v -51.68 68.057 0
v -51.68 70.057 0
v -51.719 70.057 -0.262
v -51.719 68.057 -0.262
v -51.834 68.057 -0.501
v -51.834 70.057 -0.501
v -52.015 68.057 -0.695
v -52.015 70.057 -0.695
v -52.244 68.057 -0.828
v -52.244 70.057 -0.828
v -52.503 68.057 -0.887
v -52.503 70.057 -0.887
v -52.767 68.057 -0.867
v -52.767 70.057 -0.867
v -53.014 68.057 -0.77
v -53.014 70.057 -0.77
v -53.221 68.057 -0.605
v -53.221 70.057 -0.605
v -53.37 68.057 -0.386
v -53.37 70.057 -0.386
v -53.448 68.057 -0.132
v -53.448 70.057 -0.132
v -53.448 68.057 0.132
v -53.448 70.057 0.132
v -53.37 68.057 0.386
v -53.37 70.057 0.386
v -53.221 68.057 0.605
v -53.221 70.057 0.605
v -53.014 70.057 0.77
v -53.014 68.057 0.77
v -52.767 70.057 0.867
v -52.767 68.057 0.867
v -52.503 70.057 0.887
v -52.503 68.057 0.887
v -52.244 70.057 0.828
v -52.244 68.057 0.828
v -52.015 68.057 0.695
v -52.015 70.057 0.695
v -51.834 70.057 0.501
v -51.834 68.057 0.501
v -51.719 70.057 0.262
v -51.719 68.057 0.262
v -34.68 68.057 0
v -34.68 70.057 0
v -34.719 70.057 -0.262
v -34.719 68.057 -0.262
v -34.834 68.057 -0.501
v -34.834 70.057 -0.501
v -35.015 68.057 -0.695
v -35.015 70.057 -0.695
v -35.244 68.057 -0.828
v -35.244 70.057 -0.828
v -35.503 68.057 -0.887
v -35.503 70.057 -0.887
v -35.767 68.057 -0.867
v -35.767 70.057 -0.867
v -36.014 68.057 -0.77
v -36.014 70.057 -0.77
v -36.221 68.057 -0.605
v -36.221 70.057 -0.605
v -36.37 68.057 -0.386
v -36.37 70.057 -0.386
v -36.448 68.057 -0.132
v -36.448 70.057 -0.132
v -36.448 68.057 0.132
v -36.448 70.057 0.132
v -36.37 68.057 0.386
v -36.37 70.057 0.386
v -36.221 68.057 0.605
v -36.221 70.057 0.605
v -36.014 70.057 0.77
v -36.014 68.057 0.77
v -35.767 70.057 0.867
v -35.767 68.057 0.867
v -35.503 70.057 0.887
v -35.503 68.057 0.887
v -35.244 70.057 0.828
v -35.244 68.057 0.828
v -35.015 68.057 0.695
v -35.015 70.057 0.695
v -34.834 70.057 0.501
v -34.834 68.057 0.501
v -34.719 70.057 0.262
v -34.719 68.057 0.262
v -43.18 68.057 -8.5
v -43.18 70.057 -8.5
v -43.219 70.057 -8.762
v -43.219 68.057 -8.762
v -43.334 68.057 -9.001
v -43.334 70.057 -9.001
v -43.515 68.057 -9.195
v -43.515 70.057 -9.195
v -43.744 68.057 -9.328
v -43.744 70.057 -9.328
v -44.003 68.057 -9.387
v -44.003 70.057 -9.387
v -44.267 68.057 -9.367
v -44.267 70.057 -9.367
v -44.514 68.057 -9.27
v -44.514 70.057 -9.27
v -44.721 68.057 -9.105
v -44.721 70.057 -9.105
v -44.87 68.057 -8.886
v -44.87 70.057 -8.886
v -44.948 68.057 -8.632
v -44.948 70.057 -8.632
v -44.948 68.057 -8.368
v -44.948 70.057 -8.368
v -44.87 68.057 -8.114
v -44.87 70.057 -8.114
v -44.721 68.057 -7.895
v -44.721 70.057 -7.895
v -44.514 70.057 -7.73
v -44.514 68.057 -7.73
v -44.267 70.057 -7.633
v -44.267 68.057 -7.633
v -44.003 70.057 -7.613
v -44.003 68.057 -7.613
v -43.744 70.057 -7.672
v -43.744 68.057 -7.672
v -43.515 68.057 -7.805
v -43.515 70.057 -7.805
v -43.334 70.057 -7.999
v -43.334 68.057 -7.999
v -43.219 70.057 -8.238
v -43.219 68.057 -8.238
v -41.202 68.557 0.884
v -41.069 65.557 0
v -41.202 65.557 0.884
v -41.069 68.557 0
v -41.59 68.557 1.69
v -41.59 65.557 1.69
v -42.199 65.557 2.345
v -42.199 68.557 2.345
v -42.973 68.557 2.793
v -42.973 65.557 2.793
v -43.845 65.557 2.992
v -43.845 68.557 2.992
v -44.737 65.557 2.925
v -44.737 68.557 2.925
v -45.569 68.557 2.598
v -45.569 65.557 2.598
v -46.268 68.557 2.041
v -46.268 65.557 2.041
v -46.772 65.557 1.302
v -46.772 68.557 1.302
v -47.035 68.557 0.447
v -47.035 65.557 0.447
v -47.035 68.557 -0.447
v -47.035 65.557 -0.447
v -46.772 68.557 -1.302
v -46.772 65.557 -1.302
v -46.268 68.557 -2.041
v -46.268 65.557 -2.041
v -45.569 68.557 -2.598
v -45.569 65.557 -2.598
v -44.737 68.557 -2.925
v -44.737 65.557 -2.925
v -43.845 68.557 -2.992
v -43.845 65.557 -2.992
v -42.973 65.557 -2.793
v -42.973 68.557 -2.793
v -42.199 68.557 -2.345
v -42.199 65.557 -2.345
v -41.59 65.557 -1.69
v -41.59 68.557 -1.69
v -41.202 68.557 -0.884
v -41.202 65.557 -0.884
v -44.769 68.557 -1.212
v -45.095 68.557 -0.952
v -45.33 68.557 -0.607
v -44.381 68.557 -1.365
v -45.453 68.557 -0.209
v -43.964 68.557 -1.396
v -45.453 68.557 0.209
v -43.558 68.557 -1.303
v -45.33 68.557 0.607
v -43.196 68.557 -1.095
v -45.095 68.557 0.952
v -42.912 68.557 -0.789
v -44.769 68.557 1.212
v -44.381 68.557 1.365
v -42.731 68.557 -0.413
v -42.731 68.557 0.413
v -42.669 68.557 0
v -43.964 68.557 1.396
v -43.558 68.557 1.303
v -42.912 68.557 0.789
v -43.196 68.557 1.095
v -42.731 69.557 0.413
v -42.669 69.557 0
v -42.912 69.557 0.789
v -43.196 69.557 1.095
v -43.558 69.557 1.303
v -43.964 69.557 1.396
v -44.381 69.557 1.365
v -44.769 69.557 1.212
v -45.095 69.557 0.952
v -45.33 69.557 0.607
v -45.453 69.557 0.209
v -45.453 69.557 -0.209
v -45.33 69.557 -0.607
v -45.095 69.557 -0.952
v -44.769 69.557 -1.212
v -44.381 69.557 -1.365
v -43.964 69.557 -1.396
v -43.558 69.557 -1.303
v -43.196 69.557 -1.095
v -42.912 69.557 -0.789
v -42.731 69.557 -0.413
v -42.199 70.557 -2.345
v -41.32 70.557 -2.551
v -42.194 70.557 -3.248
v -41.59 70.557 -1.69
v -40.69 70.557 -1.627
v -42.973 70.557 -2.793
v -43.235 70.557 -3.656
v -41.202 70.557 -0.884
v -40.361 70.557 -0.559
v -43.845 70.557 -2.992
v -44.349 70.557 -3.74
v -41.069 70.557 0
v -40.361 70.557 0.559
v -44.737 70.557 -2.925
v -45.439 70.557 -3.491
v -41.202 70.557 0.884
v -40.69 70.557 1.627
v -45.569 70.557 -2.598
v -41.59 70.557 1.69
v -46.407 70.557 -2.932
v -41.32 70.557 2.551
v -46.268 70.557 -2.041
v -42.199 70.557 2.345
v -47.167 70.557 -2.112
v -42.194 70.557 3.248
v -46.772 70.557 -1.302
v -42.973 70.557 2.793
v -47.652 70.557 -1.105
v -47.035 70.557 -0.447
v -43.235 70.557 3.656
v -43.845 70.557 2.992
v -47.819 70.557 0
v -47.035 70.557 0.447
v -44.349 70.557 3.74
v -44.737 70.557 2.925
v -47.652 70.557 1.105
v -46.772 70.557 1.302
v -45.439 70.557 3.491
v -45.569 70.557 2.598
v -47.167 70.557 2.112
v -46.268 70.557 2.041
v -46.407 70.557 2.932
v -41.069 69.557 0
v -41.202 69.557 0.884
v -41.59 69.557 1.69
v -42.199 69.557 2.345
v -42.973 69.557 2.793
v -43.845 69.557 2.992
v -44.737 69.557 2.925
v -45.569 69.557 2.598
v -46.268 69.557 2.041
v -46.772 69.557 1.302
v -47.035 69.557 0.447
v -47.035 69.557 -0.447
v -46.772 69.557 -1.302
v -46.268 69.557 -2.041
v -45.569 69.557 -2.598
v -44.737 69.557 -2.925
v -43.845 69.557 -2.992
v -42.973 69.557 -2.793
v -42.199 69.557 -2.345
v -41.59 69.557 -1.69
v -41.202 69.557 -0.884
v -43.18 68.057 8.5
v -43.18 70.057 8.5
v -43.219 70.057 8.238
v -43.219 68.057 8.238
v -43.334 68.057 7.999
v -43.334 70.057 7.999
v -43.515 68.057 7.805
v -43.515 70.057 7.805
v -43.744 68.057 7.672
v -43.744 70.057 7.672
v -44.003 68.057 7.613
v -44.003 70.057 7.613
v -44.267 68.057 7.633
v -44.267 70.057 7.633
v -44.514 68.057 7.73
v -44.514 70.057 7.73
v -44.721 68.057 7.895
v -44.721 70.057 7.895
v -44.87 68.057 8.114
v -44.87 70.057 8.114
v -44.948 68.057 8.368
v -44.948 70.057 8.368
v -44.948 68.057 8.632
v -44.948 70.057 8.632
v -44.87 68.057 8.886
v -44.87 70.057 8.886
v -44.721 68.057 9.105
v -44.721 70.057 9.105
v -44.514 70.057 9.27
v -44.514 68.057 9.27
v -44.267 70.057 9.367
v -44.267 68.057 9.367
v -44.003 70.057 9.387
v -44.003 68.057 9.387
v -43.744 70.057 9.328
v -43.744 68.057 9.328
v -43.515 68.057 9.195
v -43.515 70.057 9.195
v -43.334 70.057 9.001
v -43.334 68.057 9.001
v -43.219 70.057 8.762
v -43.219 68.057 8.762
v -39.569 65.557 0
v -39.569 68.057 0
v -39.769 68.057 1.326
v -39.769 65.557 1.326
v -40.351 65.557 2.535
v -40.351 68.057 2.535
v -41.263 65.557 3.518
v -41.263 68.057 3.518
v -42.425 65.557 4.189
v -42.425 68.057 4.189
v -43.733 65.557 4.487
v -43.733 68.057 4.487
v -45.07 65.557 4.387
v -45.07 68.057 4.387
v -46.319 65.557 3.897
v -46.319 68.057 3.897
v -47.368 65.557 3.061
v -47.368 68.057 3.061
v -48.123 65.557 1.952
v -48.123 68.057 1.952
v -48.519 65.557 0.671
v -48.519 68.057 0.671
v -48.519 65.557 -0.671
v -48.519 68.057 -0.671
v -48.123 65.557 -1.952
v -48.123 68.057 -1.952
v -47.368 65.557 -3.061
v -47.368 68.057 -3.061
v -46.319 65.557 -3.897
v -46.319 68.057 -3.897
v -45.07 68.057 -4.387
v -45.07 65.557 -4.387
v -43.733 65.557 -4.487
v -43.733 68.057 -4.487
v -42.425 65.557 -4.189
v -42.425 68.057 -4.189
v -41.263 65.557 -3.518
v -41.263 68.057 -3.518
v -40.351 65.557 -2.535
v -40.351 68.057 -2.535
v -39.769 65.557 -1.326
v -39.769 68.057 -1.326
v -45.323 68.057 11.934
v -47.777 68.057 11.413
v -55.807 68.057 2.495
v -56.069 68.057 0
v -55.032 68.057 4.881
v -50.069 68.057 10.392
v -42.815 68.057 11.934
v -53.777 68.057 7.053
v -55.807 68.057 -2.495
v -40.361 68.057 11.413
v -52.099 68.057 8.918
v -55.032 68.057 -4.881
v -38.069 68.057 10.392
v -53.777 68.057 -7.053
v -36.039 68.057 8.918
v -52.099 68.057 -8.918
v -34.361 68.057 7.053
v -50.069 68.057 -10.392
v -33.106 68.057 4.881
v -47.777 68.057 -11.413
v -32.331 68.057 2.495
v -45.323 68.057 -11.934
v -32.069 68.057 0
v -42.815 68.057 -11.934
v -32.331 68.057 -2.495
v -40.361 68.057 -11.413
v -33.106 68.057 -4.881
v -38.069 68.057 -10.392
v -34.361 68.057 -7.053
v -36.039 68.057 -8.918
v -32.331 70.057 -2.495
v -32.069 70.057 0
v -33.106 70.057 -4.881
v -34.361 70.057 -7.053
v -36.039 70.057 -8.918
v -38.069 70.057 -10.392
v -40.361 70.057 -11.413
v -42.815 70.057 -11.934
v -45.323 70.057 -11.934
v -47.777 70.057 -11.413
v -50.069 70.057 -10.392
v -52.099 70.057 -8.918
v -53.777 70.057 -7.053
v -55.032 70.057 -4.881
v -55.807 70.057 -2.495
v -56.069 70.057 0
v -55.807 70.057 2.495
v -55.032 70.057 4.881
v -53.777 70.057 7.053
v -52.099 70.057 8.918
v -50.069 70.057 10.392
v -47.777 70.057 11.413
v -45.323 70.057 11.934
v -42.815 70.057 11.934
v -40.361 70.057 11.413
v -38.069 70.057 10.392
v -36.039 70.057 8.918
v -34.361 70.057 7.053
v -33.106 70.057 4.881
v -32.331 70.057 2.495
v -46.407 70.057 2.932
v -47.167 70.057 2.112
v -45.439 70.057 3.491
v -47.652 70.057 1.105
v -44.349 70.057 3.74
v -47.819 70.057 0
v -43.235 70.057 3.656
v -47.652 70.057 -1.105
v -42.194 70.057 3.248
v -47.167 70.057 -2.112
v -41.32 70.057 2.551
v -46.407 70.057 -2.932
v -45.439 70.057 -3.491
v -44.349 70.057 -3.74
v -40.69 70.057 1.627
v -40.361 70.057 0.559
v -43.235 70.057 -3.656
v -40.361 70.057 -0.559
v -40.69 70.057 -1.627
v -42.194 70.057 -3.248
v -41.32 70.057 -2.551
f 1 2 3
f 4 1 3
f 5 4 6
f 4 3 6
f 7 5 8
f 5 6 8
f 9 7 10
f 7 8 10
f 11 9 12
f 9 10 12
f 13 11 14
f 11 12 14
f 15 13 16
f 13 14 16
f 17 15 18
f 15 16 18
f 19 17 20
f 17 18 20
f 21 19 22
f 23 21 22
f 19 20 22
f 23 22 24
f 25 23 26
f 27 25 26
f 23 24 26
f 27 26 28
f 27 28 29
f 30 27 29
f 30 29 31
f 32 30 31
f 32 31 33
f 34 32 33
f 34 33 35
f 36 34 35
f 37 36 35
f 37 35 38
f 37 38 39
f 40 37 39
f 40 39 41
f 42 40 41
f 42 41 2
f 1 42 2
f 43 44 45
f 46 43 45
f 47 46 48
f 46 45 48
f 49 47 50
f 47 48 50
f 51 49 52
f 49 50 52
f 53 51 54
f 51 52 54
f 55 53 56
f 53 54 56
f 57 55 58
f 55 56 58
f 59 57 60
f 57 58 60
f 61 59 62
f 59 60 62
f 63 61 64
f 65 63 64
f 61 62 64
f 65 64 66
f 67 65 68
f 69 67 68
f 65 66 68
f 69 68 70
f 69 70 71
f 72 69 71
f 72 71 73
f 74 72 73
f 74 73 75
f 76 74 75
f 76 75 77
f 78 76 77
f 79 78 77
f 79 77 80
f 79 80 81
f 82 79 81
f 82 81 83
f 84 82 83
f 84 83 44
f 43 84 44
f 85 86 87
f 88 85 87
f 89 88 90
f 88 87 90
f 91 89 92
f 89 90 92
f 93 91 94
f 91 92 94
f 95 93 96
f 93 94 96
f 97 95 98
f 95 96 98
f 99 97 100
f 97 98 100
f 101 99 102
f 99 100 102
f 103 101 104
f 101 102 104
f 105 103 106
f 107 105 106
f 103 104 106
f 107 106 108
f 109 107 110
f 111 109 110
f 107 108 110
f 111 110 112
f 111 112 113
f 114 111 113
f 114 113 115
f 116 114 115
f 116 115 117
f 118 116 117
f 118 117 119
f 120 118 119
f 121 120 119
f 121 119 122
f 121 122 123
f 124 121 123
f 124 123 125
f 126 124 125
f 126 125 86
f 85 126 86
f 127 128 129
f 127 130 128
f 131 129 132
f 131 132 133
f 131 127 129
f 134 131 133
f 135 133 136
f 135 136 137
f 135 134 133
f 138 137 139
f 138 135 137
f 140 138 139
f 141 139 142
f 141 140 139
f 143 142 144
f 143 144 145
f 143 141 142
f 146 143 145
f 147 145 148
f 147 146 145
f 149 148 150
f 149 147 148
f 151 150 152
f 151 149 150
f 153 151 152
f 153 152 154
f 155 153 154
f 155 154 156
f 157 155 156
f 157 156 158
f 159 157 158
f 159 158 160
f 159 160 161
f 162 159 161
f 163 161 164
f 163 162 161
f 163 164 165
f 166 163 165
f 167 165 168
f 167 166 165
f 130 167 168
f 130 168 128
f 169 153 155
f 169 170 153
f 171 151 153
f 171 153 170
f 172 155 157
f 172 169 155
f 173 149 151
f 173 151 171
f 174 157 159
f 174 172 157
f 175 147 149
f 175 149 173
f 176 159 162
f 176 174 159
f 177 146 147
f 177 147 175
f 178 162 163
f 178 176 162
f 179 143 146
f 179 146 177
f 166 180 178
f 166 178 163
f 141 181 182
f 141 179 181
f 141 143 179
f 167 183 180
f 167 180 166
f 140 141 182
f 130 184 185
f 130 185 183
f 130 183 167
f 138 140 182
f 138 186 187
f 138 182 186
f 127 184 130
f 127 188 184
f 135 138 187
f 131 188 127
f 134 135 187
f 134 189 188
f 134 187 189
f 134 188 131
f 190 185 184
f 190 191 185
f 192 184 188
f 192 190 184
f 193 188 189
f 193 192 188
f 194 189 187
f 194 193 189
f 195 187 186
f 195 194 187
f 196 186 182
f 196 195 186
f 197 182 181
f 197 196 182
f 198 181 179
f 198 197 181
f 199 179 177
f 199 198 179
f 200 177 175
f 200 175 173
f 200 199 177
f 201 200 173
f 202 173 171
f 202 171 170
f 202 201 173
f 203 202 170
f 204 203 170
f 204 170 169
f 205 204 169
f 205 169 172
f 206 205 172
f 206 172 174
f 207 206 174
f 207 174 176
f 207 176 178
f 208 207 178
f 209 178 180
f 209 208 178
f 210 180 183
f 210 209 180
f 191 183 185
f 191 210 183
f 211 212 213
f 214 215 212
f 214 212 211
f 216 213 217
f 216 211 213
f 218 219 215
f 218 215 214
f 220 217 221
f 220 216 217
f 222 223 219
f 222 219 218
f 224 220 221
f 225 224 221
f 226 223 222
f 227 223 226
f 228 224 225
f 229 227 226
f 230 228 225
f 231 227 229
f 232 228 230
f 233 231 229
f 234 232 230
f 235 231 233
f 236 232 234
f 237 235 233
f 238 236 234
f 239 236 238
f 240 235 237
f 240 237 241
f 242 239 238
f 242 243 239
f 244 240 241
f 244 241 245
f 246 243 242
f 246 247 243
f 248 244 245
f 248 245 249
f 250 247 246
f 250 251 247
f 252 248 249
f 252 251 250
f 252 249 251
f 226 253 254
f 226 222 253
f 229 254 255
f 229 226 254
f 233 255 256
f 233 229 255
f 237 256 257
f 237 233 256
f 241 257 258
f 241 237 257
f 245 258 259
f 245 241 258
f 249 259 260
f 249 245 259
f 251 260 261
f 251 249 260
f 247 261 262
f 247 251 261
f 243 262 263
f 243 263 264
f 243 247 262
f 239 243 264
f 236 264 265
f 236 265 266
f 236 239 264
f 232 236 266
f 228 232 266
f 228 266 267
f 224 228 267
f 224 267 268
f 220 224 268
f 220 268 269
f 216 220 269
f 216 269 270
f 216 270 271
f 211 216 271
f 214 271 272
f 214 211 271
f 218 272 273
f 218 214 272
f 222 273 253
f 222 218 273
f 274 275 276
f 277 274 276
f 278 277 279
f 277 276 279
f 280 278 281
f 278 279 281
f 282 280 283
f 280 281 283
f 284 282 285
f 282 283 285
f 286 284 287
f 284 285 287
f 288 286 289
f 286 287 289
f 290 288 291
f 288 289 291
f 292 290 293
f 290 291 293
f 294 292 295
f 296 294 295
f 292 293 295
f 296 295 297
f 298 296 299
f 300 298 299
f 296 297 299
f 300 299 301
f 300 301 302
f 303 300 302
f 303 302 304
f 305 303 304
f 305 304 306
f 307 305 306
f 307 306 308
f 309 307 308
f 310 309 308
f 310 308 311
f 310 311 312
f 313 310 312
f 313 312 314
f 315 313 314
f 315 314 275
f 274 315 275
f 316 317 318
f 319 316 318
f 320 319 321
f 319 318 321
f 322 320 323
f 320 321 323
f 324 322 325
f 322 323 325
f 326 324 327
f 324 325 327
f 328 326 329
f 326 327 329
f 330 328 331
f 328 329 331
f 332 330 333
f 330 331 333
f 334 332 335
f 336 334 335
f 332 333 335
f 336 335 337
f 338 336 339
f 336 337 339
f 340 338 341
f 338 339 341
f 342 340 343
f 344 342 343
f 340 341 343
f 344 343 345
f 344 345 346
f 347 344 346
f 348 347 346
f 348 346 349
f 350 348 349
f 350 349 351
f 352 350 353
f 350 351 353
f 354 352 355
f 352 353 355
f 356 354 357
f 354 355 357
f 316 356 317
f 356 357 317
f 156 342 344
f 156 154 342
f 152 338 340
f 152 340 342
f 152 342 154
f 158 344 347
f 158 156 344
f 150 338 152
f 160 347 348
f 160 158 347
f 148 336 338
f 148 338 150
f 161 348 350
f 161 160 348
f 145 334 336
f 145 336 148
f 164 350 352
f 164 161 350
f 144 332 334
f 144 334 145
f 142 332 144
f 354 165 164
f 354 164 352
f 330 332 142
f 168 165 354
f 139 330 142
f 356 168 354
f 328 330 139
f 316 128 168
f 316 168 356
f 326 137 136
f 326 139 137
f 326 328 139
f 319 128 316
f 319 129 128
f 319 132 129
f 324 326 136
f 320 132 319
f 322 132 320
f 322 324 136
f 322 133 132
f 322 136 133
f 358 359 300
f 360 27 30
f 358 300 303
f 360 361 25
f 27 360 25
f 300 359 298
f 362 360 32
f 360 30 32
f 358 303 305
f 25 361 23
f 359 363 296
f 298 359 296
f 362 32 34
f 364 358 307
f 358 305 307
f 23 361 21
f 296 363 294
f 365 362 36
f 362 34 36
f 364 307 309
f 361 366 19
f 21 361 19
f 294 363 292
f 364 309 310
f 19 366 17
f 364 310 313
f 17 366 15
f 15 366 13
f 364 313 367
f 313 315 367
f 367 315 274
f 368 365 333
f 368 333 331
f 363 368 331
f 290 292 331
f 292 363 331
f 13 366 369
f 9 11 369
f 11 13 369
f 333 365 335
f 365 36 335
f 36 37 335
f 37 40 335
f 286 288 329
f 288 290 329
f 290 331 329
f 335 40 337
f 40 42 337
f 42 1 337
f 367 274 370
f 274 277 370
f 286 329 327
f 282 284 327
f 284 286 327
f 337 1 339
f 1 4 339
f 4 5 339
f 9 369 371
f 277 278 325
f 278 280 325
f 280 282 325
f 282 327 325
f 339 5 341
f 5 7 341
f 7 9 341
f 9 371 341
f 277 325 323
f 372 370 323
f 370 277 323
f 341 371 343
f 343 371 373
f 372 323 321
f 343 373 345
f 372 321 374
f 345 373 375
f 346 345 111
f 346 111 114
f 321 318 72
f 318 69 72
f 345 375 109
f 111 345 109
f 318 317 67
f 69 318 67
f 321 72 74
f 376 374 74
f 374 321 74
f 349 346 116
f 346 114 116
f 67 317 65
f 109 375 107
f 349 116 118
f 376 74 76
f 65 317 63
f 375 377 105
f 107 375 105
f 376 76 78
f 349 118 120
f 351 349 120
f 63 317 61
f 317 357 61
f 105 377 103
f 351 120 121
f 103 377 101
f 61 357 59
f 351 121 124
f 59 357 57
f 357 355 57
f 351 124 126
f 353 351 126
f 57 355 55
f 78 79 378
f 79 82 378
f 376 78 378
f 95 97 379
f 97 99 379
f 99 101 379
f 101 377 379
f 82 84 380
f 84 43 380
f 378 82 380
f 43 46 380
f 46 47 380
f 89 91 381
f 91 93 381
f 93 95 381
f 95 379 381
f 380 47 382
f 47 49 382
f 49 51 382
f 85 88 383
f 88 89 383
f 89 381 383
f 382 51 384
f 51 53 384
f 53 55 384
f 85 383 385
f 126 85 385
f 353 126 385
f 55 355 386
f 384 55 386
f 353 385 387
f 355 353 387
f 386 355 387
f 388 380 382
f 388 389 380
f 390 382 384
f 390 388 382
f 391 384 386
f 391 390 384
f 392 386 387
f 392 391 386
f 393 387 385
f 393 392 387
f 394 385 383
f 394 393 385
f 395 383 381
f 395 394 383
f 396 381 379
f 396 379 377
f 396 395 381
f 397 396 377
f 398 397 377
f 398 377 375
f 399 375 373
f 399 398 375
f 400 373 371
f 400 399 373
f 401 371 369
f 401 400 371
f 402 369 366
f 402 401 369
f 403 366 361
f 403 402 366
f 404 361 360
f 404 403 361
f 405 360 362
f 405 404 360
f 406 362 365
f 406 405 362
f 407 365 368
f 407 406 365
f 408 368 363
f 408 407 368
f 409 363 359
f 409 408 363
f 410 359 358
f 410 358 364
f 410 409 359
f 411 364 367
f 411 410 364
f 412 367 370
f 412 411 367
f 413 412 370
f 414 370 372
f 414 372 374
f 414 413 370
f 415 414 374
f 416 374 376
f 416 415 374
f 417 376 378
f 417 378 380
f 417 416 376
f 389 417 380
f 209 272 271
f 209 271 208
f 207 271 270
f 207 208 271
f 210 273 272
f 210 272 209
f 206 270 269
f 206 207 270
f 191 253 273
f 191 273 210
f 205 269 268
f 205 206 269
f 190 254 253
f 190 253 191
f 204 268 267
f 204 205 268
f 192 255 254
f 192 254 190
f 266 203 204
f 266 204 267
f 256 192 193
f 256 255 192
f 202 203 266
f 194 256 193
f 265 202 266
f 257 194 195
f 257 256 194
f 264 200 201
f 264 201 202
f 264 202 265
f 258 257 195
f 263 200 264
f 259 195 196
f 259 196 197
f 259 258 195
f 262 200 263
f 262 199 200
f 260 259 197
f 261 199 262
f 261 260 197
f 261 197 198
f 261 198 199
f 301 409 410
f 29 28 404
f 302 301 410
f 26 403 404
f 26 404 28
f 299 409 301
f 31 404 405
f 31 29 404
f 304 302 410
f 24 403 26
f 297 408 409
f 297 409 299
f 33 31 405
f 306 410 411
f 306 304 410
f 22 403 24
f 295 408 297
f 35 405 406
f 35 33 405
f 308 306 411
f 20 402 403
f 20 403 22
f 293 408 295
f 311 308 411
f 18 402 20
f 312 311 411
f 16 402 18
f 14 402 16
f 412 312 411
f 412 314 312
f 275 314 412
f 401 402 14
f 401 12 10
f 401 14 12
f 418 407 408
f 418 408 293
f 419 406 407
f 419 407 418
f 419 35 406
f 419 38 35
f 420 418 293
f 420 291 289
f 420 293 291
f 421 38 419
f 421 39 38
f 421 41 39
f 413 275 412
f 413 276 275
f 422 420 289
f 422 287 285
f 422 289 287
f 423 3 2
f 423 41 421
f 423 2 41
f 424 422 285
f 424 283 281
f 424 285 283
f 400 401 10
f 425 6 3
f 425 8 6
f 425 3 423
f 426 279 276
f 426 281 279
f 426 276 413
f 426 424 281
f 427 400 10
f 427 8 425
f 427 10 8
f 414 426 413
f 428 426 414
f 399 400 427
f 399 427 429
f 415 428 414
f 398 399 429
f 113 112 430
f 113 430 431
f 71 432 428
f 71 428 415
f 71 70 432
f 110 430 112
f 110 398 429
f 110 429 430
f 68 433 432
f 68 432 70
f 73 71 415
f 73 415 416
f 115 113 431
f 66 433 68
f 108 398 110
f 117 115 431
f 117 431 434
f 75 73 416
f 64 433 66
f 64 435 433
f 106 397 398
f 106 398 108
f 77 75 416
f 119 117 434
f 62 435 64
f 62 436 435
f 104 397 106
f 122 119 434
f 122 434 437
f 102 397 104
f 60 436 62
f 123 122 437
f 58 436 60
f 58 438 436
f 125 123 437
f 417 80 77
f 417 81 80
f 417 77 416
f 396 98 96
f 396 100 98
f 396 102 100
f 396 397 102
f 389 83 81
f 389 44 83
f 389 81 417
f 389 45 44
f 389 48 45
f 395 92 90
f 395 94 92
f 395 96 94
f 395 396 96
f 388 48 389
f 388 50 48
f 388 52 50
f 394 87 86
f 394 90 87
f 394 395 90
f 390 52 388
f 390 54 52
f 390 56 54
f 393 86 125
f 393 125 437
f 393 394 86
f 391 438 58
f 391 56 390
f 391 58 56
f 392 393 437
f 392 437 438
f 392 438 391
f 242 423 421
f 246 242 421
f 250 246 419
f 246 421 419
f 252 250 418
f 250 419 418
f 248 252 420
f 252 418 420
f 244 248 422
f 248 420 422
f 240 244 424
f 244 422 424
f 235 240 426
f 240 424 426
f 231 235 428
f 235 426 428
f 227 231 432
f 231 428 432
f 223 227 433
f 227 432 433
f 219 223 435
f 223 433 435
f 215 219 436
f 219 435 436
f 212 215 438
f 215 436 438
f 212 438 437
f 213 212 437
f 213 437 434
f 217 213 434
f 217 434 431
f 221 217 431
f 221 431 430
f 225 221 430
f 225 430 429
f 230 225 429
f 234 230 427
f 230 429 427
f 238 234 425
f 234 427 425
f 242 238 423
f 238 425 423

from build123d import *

# Parameters (mm, degrees)
SKETCH1_W                  = 12
SKETCH1_H                  = 2
SKETCH2_R                  = 4.5
BOSS_EXTRUDE1_DEPTH        = 2.5
SKETCH3_R                  = 3.75
BOSS_EXTRUDE2_DEPTH        = 0.5
M1_6_CLEARANCE_HOLE1_D     = 1.778
M1_6_CLEARANCE_HOLE1_DEPTH = 2.5


with BuildPart() as part:
    # Sketch1 → Revolve1 (revolve)
    with BuildSketch(Plane(origin=(0, 0, 0), x_dir=(-1, 0, 0), z_dir=(0, 0, -1))):
        with Locations((38.069, 69.05714)):
            Rectangle(SKETCH1_W, SKETCH1_H)
    revolve(axis=Axis((-44.069, 68.05714, 0), (0, 1, 0)))

    # Sketch2 → Boss-Extrude1 (add)
    with BuildSketch(Plane.XZ.offset(-68.05714)):
        with Locations((-44.069, 0)):
            Circle(SKETCH2_R)
    extrude(amount=BOSS_EXTRUDE1_DEPTH)

    # Sketch3 → Boss-Extrude2 (add)
    with BuildSketch(Plane(origin=(0, 70.05714, 0), x_dir=(-1, 0, 0), z_dir=(0, 1, 0))):
        with Locations((44.069, 0)):
            Circle(SKETCH3_R)
    extrude(amount=BOSS_EXTRUDE2_DEPTH)

    # Sketch4 → Cut-Revolve1 (revolve, cut)
    with BuildSketch(Plane.XY):
        Polygon((-41.069, 70.55714), (-44.069, 70.55714), (-44.069, 65.55714), (-41.069, 65.55714), (-41.069, 68.55714), (-42.669, 68.55714), (-42.669, 69.55714), (-41.069, 69.55714), align=None)
    revolve(axis=Axis((-44.069, 70.55714, 0), (0, -1, 0)), mode=Mode.SUBTRACT)

    # M1.6 Clearance Hole1
    with Locations(Plane(origin=(0, 68.05714, 0), x_dir=(-1, 0, 0), z_dir=(0, -1, 0))):
        with Locations((44.069, 8.5), (52.569, 0), (35.569, 0), (44.069, -8.5)):
            Hole(M1_6_CLEARANCE_HOLE1_D / 2, depth=M1_6_CLEARANCE_HOLE1_DEPTH)


solid = part.part
